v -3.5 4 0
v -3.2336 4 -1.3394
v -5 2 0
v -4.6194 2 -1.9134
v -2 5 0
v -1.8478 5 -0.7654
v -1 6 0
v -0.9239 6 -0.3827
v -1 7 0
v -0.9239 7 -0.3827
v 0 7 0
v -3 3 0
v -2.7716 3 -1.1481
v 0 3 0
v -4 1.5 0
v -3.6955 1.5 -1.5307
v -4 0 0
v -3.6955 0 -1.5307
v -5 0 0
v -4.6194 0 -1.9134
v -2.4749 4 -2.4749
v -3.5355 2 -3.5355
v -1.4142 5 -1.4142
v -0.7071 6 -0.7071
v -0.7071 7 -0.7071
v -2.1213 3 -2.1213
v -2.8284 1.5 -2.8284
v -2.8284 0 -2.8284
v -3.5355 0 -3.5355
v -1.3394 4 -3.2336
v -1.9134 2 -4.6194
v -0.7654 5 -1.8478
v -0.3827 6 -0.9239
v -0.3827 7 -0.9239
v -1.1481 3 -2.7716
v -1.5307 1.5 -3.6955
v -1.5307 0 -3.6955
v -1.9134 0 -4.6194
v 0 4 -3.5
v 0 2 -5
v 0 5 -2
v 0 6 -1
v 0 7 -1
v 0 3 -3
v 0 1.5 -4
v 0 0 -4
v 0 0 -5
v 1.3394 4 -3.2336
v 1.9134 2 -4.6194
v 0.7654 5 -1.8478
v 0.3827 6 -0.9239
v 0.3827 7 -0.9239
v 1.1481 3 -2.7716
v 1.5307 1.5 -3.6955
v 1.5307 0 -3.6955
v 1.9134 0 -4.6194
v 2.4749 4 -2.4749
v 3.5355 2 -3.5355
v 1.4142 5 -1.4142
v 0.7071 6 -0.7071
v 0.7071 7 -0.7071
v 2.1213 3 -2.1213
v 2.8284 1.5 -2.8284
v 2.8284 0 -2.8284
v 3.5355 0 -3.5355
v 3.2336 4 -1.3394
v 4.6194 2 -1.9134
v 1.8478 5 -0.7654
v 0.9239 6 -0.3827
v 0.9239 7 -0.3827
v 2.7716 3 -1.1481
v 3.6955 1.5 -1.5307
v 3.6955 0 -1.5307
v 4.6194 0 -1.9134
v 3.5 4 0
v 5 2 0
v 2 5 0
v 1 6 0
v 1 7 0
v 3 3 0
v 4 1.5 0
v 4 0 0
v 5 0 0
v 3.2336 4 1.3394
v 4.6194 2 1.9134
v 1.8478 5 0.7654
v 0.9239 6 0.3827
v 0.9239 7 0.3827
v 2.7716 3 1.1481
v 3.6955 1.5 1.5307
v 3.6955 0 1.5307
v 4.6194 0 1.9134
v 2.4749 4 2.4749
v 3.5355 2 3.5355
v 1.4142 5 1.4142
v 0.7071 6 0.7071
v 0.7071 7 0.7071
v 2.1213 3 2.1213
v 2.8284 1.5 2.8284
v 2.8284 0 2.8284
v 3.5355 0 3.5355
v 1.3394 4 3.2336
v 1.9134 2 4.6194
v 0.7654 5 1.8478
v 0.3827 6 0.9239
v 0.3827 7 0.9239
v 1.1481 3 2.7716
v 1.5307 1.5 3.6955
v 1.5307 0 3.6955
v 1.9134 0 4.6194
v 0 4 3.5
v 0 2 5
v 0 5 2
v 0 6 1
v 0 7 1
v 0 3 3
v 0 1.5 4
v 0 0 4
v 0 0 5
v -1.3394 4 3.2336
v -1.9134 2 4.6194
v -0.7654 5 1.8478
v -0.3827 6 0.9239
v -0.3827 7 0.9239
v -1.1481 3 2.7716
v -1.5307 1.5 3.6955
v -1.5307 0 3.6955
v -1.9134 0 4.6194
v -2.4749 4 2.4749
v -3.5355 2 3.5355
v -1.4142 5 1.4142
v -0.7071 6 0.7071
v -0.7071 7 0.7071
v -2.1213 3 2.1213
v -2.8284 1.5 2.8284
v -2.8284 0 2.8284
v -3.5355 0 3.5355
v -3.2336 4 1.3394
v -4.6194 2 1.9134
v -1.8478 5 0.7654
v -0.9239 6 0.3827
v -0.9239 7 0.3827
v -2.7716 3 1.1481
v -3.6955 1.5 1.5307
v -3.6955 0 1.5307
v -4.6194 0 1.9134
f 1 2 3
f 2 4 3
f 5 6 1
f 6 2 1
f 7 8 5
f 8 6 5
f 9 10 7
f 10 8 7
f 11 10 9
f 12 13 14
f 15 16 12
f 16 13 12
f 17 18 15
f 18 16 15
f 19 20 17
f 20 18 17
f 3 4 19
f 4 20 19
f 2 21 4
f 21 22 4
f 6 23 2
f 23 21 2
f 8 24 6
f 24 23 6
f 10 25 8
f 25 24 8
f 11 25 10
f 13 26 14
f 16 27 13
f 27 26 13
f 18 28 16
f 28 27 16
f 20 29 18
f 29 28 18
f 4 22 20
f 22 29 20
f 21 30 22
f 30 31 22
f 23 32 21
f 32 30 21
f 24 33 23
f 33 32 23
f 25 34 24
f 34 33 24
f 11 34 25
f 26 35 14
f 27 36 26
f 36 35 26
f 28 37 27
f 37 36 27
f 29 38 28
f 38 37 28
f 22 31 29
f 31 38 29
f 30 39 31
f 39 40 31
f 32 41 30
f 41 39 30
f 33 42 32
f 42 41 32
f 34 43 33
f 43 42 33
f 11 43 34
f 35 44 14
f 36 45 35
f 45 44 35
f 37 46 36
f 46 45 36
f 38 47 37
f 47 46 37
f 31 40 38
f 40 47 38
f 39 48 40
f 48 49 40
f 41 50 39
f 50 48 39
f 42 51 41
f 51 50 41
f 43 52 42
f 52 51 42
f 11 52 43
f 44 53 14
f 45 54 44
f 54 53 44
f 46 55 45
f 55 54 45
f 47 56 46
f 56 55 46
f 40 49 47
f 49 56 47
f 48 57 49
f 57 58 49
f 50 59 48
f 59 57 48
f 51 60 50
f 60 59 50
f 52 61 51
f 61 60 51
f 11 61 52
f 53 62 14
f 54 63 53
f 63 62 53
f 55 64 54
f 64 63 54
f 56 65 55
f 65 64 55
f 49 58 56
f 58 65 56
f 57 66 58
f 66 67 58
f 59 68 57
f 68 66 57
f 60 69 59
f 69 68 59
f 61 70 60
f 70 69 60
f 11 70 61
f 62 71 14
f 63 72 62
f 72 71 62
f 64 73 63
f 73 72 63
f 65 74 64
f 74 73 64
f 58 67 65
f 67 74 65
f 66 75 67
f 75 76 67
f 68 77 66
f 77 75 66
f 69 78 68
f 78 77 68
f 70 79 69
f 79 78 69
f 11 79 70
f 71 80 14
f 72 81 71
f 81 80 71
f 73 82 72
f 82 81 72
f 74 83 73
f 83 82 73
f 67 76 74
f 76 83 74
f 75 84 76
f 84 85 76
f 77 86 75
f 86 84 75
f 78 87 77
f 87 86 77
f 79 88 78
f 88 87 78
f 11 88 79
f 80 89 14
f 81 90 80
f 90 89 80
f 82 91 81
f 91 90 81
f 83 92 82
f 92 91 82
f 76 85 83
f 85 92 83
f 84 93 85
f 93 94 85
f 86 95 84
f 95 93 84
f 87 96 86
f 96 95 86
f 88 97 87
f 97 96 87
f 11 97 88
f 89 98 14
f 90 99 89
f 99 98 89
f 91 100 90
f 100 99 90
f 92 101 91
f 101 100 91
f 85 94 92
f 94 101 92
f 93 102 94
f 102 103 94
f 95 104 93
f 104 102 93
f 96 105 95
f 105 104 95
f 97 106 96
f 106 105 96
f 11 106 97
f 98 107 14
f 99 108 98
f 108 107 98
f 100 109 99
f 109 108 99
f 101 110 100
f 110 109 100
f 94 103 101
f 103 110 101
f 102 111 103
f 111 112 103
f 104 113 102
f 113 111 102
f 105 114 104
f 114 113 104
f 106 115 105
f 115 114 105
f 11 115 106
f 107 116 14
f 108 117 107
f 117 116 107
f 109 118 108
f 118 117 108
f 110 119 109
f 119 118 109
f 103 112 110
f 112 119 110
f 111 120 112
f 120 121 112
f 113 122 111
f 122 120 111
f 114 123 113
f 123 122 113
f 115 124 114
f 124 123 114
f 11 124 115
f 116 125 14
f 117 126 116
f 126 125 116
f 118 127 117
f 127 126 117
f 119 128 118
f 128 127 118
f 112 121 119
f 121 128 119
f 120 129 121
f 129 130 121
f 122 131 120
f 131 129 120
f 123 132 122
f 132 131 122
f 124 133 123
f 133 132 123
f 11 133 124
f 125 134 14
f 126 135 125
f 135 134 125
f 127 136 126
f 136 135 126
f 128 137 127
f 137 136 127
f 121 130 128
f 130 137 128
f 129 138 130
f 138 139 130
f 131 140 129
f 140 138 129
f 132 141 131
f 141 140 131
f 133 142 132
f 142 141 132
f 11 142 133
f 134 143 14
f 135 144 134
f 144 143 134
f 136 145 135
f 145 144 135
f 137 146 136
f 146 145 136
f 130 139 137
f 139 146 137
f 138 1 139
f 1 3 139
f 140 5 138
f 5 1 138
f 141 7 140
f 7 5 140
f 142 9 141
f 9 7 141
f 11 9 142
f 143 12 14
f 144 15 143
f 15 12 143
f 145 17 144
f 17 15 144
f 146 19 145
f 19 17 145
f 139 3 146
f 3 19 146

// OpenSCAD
rotate([-90, 0, 0]) {
    rotate_extrude($fn=16) {
        translate([5, 0, 0]) {
            scale([-1, 1, 1]) {
                polygon(points=[[0,0],
                                [0,2],
                                [1.5,4],
                                [3,5],
                                [4,6],
                                [4,7],
                                [5,7],
                                [5,3],
                                [2,3],
                                [1,1.5],
                                [1,0],
                                [0,0]]);
            }
        }
    }
}
